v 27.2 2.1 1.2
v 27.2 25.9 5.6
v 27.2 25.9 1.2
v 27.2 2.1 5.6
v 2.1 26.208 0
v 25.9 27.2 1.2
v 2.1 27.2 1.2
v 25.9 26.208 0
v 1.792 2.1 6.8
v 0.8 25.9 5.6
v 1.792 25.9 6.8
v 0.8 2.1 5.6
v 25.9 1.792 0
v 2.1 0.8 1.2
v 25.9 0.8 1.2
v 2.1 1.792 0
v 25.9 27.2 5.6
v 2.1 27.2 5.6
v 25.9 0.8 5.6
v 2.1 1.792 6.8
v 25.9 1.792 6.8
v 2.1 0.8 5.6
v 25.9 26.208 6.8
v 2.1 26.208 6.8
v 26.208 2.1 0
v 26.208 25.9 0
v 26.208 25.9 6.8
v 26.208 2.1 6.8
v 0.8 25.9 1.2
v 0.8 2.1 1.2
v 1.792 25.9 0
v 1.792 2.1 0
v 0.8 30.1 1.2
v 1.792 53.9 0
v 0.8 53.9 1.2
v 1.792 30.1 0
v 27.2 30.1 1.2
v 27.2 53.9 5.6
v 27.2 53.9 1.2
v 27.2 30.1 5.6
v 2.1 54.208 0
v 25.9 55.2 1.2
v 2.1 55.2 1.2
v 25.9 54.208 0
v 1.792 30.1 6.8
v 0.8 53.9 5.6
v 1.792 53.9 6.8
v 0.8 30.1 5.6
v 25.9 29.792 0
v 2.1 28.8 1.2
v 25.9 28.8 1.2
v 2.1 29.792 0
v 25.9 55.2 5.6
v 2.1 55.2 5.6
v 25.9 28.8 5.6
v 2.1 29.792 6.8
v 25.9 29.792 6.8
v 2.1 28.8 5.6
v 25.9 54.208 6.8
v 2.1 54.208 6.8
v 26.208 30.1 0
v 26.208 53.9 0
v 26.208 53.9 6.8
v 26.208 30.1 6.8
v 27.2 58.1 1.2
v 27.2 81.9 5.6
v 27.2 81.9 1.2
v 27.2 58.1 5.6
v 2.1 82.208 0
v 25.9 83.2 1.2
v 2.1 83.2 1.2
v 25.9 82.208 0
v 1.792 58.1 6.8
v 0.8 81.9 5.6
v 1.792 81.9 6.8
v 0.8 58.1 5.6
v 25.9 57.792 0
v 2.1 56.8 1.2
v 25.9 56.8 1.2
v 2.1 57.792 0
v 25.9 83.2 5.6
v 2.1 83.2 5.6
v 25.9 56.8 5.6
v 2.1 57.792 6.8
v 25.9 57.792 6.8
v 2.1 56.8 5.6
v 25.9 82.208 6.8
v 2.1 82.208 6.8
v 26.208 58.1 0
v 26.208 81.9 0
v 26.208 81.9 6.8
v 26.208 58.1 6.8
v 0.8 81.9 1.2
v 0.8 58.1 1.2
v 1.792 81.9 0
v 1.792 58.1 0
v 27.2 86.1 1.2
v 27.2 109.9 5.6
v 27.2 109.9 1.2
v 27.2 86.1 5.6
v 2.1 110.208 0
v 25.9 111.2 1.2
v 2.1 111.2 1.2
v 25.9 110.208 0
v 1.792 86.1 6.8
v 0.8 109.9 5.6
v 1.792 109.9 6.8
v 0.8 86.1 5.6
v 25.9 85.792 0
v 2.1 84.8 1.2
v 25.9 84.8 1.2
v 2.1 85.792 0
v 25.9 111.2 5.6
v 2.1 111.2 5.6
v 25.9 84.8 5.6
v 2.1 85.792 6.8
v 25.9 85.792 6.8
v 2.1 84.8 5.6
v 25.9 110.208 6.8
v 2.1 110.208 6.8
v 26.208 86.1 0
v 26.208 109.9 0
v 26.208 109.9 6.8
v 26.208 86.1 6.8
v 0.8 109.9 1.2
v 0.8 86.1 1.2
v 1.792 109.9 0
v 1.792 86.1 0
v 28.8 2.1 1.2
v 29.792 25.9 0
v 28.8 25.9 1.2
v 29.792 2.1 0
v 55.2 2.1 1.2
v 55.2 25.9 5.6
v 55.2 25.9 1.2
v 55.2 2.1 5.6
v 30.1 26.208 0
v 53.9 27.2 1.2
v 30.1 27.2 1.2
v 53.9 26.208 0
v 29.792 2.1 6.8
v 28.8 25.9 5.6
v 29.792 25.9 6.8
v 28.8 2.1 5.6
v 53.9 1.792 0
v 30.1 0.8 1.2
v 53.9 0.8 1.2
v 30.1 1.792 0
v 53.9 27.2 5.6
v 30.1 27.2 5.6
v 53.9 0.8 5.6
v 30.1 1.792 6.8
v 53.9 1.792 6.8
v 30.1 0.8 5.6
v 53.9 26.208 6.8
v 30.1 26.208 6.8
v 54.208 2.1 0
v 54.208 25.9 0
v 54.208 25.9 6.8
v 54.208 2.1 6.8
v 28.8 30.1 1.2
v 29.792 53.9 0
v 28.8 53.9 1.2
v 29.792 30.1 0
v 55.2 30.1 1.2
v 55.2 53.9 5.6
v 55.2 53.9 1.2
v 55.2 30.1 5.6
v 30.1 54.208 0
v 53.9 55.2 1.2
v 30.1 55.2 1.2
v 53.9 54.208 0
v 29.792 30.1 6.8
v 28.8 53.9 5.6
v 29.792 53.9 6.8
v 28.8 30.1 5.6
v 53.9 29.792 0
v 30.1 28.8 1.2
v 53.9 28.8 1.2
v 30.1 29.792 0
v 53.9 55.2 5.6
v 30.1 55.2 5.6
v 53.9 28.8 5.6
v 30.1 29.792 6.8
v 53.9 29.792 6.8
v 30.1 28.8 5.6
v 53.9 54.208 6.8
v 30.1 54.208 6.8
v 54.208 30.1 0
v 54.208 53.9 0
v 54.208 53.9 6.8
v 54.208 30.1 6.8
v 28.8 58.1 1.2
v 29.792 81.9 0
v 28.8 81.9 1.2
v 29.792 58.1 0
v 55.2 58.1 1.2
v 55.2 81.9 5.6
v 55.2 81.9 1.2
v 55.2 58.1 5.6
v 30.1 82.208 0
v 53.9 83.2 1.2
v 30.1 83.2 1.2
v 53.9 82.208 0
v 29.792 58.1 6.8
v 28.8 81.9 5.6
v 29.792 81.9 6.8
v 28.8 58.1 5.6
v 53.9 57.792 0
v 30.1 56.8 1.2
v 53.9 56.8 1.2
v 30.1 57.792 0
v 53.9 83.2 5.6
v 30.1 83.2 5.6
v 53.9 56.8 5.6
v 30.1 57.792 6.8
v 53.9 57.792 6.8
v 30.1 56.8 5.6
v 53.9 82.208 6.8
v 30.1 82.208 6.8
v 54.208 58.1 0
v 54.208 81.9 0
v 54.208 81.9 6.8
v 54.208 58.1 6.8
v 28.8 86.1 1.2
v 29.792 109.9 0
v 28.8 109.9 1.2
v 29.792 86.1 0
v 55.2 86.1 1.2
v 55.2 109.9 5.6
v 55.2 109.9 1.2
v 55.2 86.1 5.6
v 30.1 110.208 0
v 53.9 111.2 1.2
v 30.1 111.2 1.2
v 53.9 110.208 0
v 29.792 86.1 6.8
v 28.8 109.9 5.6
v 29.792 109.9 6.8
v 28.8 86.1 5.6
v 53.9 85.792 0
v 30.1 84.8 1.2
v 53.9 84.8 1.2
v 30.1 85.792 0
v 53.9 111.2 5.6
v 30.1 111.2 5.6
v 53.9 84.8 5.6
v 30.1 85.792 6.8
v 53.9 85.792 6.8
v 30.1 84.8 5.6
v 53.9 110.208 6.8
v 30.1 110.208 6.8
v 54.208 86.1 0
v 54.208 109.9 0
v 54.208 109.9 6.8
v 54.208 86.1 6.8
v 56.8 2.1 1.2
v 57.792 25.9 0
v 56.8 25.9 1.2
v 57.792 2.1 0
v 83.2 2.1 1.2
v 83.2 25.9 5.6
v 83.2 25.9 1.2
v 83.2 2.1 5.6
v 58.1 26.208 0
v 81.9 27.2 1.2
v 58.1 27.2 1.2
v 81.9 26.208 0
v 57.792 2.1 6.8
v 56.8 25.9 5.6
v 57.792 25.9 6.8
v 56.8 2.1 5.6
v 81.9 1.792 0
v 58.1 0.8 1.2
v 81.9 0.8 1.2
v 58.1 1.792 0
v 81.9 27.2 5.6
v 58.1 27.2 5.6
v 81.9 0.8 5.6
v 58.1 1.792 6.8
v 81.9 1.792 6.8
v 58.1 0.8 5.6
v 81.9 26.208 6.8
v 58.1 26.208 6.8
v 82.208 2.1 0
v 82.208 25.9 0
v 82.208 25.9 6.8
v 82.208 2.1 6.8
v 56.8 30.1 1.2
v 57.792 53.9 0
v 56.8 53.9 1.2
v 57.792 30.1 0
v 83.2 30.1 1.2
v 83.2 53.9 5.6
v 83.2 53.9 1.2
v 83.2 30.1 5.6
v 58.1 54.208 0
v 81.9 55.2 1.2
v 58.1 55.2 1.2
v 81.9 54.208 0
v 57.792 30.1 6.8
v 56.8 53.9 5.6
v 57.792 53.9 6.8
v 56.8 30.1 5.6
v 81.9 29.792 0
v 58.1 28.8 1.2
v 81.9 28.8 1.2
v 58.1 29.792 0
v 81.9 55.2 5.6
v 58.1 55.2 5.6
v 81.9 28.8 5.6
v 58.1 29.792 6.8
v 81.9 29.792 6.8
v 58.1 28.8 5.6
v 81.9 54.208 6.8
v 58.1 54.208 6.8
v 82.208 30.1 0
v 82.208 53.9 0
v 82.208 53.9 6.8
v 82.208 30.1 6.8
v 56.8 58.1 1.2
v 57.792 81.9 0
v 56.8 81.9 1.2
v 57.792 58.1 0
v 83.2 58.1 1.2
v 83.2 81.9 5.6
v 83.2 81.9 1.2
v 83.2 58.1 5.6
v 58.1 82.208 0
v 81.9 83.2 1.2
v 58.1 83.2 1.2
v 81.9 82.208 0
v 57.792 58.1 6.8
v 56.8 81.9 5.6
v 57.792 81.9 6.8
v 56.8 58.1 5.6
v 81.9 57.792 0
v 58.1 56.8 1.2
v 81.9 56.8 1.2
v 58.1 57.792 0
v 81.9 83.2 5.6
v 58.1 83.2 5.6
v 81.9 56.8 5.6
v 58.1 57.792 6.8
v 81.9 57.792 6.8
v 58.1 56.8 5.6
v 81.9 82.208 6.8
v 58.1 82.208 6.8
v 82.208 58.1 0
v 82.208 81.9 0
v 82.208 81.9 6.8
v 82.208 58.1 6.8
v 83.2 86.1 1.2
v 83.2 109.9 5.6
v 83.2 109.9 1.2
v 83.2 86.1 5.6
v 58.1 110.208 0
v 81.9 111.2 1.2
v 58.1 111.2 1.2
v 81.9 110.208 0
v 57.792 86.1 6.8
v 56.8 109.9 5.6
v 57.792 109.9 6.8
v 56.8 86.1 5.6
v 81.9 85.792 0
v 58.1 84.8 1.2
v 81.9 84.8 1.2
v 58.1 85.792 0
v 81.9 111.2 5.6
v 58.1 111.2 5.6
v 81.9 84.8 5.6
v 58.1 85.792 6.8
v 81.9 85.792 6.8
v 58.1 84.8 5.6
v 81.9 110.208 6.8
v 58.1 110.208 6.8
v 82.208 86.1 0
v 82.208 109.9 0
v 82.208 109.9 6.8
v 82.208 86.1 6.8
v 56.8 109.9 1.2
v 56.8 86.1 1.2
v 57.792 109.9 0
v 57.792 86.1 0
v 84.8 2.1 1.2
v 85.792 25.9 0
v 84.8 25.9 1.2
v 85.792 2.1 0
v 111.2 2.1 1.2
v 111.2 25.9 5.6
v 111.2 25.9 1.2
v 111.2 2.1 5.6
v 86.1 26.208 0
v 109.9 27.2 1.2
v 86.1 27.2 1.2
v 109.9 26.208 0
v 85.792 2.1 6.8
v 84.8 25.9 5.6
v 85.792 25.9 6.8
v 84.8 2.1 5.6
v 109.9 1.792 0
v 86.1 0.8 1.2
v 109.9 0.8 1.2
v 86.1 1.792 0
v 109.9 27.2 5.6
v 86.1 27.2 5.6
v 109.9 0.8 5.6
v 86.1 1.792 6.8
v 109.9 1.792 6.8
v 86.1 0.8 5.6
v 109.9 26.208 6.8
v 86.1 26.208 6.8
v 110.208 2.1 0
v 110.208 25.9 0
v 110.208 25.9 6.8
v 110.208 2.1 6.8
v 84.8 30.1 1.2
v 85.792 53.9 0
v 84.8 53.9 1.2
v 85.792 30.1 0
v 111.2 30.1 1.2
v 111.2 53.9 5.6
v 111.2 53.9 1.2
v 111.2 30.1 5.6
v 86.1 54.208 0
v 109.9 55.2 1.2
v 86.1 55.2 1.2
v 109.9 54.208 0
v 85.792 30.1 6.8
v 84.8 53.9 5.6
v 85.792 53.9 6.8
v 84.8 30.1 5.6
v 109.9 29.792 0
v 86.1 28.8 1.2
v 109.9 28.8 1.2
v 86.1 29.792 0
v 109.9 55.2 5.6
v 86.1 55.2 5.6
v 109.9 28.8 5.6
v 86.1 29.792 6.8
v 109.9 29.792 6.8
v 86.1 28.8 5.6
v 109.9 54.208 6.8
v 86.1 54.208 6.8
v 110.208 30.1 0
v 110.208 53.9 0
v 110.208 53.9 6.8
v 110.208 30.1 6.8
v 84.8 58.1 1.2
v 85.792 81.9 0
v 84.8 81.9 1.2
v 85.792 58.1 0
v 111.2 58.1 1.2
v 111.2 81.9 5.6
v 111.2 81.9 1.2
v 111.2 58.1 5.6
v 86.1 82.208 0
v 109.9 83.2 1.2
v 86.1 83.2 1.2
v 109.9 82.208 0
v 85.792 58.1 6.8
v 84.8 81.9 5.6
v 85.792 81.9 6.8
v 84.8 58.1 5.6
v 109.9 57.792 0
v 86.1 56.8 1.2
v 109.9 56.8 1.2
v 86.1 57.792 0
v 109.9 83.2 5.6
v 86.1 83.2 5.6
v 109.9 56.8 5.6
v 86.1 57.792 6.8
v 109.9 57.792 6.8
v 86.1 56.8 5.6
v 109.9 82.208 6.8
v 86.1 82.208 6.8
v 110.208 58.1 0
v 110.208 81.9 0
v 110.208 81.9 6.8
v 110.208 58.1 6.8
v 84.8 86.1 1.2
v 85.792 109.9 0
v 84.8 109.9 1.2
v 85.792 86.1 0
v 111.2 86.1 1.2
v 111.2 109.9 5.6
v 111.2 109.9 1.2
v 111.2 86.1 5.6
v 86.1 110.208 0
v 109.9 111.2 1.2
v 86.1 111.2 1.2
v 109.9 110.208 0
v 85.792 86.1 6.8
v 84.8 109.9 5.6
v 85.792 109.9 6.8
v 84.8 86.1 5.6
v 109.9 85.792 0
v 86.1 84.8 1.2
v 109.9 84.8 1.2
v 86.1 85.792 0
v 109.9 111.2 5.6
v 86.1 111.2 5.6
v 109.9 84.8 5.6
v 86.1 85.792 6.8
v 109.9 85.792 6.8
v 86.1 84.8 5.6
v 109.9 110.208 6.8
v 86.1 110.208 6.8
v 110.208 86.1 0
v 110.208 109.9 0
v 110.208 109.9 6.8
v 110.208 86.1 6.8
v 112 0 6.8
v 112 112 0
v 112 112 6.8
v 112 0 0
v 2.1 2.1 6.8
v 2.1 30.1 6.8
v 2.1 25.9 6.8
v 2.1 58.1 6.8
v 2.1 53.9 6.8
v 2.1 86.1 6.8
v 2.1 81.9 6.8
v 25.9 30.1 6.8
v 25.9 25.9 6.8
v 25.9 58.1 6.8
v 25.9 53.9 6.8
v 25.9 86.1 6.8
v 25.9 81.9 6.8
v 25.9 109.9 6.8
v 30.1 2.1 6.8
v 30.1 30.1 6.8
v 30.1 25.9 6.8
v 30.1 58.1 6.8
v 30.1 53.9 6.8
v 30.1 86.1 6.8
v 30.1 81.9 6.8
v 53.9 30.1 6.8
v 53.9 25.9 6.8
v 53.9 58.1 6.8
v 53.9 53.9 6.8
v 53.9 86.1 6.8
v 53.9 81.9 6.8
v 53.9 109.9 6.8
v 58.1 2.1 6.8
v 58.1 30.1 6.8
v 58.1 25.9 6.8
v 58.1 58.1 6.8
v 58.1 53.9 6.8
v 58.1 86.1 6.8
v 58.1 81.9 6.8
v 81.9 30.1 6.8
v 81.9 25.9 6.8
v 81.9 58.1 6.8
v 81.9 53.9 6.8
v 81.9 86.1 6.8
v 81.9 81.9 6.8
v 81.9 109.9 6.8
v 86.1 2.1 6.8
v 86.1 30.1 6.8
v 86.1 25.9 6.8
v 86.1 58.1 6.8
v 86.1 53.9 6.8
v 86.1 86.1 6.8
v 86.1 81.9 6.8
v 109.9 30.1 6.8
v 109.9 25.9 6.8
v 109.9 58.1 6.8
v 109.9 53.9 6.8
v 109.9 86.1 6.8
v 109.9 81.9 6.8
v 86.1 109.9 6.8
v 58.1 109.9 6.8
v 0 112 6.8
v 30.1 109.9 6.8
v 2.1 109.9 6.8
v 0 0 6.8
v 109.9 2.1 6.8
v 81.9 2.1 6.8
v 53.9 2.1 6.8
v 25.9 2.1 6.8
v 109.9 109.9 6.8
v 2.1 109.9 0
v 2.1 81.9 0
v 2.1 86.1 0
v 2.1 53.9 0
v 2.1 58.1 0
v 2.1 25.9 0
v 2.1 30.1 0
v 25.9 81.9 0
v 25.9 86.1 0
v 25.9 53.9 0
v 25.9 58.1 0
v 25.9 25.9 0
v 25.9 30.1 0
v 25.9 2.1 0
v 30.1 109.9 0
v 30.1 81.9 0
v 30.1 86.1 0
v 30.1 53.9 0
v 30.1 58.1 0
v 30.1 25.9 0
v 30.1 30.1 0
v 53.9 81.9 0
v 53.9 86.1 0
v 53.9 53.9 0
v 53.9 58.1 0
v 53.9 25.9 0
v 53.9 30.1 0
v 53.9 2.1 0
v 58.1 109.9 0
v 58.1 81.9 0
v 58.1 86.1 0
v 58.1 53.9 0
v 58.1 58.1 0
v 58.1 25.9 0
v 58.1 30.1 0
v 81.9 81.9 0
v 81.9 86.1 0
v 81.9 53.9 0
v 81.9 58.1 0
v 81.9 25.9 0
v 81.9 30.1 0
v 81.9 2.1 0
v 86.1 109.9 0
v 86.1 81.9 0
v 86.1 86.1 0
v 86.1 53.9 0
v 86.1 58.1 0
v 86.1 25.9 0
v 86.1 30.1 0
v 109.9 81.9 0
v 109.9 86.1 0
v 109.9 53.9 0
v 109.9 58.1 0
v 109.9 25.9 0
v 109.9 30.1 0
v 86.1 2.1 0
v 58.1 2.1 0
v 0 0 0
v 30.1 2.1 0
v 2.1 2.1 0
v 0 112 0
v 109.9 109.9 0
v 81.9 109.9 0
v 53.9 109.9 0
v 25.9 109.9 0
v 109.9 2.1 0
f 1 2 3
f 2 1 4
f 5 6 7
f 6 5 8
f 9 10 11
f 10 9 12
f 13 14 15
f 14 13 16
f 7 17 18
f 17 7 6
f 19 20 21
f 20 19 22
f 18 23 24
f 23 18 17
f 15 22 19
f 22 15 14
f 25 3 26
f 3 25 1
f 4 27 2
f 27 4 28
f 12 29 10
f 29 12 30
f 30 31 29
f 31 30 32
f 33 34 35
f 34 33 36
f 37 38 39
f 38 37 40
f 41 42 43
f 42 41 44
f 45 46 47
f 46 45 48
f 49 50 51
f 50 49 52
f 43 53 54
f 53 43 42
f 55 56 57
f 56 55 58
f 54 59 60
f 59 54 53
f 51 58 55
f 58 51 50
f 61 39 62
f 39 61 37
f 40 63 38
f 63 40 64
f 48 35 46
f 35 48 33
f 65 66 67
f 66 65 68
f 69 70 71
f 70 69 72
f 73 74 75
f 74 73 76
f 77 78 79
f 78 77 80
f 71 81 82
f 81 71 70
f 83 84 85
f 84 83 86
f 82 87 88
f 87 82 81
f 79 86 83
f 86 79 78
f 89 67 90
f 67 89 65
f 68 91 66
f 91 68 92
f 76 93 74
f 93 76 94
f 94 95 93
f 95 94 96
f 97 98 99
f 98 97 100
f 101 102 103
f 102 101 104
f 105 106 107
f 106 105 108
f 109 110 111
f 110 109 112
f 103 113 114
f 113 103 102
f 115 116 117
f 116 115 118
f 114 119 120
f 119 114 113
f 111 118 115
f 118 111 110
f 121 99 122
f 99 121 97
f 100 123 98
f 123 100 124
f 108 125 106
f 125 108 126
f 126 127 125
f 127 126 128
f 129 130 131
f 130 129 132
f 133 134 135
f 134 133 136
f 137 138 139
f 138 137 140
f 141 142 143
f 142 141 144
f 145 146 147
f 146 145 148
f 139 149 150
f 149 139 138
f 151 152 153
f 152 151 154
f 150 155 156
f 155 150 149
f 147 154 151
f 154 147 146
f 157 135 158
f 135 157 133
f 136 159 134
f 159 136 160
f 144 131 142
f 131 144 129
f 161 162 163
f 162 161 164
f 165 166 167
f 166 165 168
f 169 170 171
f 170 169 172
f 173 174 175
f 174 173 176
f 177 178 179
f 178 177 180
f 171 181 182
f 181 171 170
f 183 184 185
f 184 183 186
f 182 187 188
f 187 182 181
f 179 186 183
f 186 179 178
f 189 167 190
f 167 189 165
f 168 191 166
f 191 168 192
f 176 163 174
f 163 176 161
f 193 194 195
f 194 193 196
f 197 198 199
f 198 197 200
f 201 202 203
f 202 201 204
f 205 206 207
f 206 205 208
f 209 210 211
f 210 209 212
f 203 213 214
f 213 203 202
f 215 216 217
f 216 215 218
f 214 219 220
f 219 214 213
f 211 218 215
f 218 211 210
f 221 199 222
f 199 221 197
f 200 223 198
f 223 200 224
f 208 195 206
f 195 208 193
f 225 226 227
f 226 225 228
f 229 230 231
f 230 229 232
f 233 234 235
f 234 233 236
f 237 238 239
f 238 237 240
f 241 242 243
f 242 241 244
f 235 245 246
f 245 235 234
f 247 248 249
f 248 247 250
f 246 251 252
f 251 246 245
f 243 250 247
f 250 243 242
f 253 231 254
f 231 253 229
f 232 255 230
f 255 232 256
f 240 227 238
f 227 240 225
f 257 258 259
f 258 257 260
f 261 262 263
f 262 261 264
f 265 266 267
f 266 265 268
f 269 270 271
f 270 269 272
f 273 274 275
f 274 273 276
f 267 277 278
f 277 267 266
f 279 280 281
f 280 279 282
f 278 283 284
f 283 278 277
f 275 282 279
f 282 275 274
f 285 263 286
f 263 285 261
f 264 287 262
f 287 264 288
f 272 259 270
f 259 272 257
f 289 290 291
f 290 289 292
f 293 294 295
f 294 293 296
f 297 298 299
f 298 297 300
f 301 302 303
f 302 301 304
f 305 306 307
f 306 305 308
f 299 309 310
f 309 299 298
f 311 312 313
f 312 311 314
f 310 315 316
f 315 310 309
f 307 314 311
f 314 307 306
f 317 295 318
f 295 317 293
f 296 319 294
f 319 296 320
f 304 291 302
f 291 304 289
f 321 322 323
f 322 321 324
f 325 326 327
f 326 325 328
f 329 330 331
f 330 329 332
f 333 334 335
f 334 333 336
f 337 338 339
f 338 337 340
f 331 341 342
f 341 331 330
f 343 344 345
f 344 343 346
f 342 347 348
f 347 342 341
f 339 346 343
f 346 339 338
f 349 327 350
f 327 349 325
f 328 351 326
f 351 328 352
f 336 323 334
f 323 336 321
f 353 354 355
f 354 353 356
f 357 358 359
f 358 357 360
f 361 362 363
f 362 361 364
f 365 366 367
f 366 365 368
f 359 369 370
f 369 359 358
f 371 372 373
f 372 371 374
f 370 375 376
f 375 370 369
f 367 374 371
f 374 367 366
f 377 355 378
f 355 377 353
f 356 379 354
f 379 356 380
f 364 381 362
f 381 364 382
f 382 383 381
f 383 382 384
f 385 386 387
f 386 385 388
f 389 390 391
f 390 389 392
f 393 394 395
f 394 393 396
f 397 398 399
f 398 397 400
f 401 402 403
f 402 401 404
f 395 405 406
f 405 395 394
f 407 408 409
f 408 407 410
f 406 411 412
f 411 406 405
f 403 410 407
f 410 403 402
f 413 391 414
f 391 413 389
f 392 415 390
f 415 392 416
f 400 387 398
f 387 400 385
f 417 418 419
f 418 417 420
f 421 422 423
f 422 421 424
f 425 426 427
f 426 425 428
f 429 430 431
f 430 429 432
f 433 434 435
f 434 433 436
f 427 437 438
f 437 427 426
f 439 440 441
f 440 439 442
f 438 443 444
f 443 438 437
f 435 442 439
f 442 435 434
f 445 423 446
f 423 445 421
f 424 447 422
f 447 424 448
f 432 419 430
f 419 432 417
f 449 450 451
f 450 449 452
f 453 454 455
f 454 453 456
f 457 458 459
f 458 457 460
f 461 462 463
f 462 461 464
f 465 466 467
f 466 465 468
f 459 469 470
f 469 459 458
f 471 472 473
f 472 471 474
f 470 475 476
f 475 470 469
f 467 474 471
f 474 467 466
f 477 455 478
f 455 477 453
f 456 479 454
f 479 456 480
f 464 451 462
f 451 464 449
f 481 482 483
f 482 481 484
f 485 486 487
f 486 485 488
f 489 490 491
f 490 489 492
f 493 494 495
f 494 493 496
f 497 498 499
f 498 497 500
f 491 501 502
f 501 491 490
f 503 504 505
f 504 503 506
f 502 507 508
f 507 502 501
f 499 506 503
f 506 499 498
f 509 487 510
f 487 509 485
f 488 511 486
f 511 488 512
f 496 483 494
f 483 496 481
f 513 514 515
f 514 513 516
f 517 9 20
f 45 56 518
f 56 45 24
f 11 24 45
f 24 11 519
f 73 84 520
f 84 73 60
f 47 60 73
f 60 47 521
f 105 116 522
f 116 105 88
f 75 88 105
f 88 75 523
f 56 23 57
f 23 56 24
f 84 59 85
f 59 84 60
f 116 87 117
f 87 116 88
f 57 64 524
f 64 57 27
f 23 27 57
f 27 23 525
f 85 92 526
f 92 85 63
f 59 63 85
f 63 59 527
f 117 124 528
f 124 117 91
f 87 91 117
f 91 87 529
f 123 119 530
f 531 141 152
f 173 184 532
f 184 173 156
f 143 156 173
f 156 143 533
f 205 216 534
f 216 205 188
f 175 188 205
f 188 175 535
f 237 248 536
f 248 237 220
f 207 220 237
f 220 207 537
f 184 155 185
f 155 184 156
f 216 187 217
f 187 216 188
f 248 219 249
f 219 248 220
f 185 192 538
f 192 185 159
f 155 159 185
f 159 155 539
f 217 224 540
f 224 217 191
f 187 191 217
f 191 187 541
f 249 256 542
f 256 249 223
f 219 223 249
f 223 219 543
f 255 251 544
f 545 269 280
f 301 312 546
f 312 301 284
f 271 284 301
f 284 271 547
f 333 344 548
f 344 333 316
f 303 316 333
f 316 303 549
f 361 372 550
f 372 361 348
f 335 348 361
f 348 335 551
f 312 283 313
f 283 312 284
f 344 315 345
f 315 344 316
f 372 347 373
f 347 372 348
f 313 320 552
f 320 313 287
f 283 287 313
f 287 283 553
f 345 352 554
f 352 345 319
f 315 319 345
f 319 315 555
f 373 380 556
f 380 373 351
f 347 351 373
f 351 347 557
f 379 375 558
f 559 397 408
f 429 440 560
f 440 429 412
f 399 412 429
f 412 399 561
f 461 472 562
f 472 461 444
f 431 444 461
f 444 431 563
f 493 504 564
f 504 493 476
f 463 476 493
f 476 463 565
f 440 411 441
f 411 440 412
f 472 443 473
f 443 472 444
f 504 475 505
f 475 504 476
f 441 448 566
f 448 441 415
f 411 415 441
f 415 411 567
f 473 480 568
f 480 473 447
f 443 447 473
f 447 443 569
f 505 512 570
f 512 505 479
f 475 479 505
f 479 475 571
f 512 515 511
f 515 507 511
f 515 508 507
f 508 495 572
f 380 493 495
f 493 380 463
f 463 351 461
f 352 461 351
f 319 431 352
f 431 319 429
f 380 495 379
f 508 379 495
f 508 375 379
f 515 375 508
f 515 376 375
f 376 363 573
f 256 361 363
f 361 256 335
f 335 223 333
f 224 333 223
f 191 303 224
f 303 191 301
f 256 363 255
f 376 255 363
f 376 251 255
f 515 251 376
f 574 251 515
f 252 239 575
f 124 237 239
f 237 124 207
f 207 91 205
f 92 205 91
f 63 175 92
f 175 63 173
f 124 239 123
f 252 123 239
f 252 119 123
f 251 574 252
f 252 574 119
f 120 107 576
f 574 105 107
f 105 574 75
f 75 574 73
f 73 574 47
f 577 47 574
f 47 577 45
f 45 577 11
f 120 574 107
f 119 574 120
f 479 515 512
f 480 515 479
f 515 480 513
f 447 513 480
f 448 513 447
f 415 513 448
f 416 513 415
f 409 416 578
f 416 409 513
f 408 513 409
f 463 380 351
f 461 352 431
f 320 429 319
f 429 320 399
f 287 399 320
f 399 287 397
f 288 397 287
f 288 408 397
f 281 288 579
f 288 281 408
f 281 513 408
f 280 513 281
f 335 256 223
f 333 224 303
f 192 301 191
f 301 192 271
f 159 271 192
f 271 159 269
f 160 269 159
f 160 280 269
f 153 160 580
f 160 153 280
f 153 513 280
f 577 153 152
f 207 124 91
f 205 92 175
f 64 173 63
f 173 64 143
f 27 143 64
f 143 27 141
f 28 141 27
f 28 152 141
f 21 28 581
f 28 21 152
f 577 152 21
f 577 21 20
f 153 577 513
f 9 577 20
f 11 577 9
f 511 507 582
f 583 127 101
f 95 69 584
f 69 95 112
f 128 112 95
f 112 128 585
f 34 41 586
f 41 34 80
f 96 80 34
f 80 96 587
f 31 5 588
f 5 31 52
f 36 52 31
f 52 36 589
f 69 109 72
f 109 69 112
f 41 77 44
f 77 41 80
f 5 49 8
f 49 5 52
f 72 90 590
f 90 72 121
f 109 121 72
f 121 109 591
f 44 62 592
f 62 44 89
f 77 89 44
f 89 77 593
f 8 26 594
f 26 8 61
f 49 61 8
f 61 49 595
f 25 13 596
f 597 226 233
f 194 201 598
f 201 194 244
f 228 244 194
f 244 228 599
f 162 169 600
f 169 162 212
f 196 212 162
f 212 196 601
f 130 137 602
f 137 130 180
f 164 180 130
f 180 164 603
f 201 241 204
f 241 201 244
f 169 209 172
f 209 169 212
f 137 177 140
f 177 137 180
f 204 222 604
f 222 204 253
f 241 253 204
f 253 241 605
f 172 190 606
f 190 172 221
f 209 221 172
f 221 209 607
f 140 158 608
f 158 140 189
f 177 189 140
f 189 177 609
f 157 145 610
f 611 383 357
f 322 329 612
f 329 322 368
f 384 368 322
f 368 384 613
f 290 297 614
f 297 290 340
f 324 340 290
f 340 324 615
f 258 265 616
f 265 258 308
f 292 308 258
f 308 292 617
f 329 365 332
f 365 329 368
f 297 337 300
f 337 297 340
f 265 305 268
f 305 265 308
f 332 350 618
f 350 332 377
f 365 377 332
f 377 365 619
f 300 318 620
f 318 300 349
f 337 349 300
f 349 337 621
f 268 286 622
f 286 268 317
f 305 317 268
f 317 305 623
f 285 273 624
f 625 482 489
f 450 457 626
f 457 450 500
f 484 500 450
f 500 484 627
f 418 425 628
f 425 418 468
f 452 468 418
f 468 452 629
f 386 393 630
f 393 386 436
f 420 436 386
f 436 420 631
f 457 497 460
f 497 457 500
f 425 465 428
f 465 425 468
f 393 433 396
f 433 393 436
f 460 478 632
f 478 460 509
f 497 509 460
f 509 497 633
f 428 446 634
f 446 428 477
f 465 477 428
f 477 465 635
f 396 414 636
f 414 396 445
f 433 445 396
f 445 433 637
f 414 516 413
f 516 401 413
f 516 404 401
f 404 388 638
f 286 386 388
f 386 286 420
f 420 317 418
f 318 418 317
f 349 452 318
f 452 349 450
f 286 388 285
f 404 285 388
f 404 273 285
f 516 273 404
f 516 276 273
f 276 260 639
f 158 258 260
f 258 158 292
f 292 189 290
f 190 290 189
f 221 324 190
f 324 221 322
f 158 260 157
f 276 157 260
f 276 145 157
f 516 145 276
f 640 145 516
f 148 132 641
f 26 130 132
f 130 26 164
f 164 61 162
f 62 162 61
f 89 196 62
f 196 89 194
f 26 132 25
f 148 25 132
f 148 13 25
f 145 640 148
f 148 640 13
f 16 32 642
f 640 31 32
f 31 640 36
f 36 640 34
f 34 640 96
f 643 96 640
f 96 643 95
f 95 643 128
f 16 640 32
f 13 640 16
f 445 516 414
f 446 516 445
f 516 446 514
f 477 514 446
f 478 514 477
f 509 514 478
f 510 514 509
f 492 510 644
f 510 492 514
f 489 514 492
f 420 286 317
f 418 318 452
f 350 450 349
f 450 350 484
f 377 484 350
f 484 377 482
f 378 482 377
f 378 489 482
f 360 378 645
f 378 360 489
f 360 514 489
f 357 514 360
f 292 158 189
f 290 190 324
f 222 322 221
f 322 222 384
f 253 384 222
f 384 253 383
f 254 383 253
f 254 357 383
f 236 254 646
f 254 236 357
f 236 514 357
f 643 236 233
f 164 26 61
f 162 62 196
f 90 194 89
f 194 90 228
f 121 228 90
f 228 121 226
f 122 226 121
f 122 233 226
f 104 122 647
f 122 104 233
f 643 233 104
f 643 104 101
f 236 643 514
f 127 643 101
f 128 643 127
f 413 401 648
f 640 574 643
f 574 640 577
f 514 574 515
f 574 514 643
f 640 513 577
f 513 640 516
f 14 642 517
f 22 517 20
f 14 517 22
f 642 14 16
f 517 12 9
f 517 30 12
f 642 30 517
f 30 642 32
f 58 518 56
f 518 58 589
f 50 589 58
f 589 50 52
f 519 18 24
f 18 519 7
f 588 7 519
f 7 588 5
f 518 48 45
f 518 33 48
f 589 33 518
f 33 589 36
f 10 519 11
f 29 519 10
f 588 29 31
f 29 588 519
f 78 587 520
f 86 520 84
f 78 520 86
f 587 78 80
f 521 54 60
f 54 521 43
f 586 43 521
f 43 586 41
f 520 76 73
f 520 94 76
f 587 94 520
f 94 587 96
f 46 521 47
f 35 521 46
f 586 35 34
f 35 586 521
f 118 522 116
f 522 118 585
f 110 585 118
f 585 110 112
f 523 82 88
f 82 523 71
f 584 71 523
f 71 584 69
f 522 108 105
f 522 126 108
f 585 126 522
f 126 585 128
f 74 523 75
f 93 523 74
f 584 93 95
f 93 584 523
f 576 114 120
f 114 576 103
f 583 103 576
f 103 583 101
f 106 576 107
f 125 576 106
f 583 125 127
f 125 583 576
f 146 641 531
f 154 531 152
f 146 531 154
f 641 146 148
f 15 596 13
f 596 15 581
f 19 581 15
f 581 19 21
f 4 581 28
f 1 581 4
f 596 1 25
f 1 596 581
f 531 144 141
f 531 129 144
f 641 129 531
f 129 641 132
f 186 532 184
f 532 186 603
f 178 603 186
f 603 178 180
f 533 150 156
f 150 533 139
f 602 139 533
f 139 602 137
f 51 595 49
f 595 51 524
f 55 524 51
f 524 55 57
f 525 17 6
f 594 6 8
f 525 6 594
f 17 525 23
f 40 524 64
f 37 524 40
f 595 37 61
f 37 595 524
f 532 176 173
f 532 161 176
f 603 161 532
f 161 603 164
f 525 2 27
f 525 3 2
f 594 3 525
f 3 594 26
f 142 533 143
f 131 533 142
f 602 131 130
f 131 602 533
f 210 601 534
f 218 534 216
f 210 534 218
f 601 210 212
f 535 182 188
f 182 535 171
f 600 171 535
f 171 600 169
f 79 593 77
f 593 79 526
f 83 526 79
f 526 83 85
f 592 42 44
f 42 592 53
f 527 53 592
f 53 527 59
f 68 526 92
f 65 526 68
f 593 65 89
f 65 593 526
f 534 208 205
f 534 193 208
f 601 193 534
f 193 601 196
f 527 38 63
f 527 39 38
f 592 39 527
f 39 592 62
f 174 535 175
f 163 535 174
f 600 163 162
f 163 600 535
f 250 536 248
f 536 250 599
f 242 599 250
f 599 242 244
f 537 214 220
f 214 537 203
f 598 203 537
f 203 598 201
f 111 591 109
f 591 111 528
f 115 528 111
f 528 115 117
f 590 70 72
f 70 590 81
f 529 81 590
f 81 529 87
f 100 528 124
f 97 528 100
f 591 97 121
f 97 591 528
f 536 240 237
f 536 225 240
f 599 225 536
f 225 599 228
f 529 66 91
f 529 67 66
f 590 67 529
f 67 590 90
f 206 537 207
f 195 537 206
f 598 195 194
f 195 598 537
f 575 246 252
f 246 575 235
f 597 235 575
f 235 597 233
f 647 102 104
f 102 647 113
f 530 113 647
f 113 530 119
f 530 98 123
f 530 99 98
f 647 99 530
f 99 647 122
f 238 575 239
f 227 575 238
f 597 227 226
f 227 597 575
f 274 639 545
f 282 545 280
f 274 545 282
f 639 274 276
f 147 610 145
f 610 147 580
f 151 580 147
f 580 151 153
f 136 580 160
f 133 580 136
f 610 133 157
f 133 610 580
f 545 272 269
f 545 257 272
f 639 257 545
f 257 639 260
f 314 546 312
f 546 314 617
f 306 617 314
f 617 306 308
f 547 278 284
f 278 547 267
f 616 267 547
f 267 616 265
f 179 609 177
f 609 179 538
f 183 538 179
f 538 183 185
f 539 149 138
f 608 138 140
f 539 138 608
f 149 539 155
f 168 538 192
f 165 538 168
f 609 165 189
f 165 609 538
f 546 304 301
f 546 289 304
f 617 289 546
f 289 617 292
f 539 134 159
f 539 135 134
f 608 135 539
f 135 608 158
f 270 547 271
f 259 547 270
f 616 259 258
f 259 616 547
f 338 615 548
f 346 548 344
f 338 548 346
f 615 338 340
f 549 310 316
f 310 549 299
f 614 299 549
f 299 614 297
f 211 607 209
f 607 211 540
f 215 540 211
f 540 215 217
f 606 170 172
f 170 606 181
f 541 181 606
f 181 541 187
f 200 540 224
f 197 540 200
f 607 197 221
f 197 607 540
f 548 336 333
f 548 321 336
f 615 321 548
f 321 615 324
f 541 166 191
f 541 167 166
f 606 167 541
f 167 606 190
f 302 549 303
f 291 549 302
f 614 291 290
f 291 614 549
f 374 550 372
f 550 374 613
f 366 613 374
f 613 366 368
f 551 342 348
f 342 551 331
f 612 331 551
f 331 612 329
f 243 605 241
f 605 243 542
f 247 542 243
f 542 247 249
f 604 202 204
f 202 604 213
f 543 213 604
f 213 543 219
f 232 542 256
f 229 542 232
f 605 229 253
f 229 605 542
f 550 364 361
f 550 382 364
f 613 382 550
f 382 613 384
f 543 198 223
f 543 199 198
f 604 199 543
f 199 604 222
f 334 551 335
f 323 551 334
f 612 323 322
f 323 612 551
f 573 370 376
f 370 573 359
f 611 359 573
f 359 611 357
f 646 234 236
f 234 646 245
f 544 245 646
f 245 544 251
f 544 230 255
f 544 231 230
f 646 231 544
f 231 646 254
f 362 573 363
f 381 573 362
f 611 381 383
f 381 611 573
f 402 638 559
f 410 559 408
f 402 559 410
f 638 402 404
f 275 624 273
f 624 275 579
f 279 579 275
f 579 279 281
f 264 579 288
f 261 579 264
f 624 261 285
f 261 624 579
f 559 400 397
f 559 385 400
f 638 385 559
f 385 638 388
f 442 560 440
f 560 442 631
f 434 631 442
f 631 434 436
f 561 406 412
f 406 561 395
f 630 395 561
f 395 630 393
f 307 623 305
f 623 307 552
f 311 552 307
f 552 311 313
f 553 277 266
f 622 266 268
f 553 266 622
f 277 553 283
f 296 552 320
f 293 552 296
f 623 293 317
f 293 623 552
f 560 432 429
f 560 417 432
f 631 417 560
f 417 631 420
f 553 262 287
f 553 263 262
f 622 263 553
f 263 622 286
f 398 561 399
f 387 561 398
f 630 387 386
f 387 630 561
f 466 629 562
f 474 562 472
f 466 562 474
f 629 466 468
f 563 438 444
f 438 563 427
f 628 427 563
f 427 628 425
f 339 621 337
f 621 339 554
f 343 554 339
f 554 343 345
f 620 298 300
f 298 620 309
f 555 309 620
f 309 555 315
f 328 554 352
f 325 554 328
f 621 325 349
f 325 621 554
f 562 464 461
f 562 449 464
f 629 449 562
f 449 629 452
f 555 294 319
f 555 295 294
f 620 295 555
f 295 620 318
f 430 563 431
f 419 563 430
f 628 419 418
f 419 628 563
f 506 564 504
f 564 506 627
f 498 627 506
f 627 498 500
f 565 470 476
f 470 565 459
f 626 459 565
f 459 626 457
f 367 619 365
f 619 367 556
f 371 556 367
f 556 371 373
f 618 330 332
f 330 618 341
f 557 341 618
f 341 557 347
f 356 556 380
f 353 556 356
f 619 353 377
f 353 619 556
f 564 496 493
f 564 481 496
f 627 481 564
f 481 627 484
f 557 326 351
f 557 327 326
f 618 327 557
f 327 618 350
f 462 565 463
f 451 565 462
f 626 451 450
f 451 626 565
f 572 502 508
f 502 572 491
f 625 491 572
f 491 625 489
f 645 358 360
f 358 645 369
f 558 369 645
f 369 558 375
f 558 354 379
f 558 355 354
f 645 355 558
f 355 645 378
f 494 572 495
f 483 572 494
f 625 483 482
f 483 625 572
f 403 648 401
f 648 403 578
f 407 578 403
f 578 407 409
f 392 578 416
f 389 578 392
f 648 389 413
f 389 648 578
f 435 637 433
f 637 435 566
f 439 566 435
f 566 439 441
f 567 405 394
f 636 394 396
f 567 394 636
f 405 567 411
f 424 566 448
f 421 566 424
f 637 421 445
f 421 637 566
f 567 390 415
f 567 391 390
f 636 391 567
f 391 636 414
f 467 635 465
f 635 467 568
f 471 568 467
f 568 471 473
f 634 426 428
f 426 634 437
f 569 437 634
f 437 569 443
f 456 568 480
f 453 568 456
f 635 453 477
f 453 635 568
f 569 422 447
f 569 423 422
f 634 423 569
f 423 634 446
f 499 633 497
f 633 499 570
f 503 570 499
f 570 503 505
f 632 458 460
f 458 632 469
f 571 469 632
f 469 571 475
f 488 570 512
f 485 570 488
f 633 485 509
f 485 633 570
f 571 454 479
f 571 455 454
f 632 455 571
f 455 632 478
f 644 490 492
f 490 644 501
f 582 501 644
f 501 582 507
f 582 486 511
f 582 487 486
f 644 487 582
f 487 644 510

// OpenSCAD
// openGrid-style tile generator (simplified, from scratch)
// Grid pitch 28 mm. Full board 6.8 mm, Lite board 4 mm (per opengrid.world docs).
// Wall/lip profile is an approximation, not the official spec.

/* [Board] */
// Full (6.8 mm, two-sided) or Lite (4 mm, one-sided)
Tile_Type = "Full"; // [Full, Lite]
// Number of cells across (X)
Columns = 4; // [1:1:16]
// Number of cells up (Y)
Rows = 4; // [1:1:16]

/* [Mounting] */
// Countersunk screw holes at interior intersections
Screw_Holes = false;
// Screw shank diameter
Screw_Diameter = 3.4; // [2:0.1:6]
// Countersink diameter at the front face
Countersink_Diameter = 6.5; // [3:0.1:12]
// Place a screw hole every N intersections (1 = every intersection)
Screw_Spacing = 2; // [1:1:8]

/* [Hidden] */
// Lattice profile constants (approximation of the openGrid wall/lip shape)
Wall = 0.8;          // wall contributed by each tile edge (wall between cells = 1.6)
Lip = 1.0;           // how far the front/back lip protrudes into the cell
Lip_Chamfer = 1.2;   // chamfer height of the lip
Post = 4.2;          // side length of solid posts at lattice intersections
$fn = 32;
pitch = 28;
T = (Tile_Type == "Full") ? 6.8 : 4;
eps = 0.01;

module cell_cutter() {
    // Cross-section: narrow at faces (lip), wide in the middle. Convex, so hull works.
    wide   = pitch - 2 * Wall;
    narrow = wide - 2 * Lip;
    if (Tile_Type == "Full") {
        hull() {
            translate([0, 0, -eps])            linear_extrude(eps)  square(narrow, center = true);
            translate([0, 0, Lip_Chamfer])     linear_extrude(T - 2 * Lip_Chamfer) square(wide, center = true);
            translate([0, 0, T])               linear_extrude(eps)  square(narrow, center = true);
        }
    } else {
        // Lite: lip on the front (top) face only; back face fully open
        hull() {
            translate([0, 0, -eps])            linear_extrude(eps)  square(wide, center = true);
            translate([0, 0, 0])               linear_extrude(T - Lip_Chamfer) square(wide, center = true);
            translate([0, 0, T])               linear_extrude(eps)  square(narrow, center = true);
        }
    }
}

function has_screw(i, j) =
    Screw_Holes && i > 0 && j > 0 && i < Columns && j < Rows
    && i % Screw_Spacing == 0 && j % Screw_Spacing == 0;

module screw_hole() {
    translate([0, 0, -eps]) cylinder(d = Screw_Diameter, h = T + 2 * eps);
    // Countersink on the front (top) face
    translate([0, 0, T - (Countersink_Diameter - Screw_Diameter) / 2])
        cylinder(d1 = Screw_Diameter, d2 = Countersink_Diameter + 2 * eps,
                 h = (Countersink_Diameter - Screw_Diameter) / 2 + eps);
}

module tile() {
    W = Columns * pitch;
    H = Rows * pitch;
    difference() {
        union() {
            difference() {
                cube([W, H, T]);
                for (i = [0 : Columns - 1], j = [0 : Rows - 1])
                    translate([(i + 0.5) * pitch, (j + 0.5) * pitch, 0]) cell_cutter();
            }
            // Solid posts at every lattice intersection (including the outer border);
            // posts that carry a screw hole are widened into a boss around the countersink.
            for (i = [0 : Columns], j = [0 : Rows]) {
                boss = has_screw(i, j) ? Countersink_Diameter + 2 * Wall + 1 : Post;
                if (boss > 0)
                    translate([i * pitch, j * pitch, T / 2]) cube([boss, boss, T], center = true);
            }
        }
        for (i = [1 : Columns - 1], j = [1 : Rows - 1])
            if (has_screw(i, j)) translate([i * pitch, j * pitch, 0]) screw_hole();
    }
}

// Clip posts to the board footprint
intersection() {
    tile();
    cube([Columns * pitch, Rows * pitch, T]);
}
